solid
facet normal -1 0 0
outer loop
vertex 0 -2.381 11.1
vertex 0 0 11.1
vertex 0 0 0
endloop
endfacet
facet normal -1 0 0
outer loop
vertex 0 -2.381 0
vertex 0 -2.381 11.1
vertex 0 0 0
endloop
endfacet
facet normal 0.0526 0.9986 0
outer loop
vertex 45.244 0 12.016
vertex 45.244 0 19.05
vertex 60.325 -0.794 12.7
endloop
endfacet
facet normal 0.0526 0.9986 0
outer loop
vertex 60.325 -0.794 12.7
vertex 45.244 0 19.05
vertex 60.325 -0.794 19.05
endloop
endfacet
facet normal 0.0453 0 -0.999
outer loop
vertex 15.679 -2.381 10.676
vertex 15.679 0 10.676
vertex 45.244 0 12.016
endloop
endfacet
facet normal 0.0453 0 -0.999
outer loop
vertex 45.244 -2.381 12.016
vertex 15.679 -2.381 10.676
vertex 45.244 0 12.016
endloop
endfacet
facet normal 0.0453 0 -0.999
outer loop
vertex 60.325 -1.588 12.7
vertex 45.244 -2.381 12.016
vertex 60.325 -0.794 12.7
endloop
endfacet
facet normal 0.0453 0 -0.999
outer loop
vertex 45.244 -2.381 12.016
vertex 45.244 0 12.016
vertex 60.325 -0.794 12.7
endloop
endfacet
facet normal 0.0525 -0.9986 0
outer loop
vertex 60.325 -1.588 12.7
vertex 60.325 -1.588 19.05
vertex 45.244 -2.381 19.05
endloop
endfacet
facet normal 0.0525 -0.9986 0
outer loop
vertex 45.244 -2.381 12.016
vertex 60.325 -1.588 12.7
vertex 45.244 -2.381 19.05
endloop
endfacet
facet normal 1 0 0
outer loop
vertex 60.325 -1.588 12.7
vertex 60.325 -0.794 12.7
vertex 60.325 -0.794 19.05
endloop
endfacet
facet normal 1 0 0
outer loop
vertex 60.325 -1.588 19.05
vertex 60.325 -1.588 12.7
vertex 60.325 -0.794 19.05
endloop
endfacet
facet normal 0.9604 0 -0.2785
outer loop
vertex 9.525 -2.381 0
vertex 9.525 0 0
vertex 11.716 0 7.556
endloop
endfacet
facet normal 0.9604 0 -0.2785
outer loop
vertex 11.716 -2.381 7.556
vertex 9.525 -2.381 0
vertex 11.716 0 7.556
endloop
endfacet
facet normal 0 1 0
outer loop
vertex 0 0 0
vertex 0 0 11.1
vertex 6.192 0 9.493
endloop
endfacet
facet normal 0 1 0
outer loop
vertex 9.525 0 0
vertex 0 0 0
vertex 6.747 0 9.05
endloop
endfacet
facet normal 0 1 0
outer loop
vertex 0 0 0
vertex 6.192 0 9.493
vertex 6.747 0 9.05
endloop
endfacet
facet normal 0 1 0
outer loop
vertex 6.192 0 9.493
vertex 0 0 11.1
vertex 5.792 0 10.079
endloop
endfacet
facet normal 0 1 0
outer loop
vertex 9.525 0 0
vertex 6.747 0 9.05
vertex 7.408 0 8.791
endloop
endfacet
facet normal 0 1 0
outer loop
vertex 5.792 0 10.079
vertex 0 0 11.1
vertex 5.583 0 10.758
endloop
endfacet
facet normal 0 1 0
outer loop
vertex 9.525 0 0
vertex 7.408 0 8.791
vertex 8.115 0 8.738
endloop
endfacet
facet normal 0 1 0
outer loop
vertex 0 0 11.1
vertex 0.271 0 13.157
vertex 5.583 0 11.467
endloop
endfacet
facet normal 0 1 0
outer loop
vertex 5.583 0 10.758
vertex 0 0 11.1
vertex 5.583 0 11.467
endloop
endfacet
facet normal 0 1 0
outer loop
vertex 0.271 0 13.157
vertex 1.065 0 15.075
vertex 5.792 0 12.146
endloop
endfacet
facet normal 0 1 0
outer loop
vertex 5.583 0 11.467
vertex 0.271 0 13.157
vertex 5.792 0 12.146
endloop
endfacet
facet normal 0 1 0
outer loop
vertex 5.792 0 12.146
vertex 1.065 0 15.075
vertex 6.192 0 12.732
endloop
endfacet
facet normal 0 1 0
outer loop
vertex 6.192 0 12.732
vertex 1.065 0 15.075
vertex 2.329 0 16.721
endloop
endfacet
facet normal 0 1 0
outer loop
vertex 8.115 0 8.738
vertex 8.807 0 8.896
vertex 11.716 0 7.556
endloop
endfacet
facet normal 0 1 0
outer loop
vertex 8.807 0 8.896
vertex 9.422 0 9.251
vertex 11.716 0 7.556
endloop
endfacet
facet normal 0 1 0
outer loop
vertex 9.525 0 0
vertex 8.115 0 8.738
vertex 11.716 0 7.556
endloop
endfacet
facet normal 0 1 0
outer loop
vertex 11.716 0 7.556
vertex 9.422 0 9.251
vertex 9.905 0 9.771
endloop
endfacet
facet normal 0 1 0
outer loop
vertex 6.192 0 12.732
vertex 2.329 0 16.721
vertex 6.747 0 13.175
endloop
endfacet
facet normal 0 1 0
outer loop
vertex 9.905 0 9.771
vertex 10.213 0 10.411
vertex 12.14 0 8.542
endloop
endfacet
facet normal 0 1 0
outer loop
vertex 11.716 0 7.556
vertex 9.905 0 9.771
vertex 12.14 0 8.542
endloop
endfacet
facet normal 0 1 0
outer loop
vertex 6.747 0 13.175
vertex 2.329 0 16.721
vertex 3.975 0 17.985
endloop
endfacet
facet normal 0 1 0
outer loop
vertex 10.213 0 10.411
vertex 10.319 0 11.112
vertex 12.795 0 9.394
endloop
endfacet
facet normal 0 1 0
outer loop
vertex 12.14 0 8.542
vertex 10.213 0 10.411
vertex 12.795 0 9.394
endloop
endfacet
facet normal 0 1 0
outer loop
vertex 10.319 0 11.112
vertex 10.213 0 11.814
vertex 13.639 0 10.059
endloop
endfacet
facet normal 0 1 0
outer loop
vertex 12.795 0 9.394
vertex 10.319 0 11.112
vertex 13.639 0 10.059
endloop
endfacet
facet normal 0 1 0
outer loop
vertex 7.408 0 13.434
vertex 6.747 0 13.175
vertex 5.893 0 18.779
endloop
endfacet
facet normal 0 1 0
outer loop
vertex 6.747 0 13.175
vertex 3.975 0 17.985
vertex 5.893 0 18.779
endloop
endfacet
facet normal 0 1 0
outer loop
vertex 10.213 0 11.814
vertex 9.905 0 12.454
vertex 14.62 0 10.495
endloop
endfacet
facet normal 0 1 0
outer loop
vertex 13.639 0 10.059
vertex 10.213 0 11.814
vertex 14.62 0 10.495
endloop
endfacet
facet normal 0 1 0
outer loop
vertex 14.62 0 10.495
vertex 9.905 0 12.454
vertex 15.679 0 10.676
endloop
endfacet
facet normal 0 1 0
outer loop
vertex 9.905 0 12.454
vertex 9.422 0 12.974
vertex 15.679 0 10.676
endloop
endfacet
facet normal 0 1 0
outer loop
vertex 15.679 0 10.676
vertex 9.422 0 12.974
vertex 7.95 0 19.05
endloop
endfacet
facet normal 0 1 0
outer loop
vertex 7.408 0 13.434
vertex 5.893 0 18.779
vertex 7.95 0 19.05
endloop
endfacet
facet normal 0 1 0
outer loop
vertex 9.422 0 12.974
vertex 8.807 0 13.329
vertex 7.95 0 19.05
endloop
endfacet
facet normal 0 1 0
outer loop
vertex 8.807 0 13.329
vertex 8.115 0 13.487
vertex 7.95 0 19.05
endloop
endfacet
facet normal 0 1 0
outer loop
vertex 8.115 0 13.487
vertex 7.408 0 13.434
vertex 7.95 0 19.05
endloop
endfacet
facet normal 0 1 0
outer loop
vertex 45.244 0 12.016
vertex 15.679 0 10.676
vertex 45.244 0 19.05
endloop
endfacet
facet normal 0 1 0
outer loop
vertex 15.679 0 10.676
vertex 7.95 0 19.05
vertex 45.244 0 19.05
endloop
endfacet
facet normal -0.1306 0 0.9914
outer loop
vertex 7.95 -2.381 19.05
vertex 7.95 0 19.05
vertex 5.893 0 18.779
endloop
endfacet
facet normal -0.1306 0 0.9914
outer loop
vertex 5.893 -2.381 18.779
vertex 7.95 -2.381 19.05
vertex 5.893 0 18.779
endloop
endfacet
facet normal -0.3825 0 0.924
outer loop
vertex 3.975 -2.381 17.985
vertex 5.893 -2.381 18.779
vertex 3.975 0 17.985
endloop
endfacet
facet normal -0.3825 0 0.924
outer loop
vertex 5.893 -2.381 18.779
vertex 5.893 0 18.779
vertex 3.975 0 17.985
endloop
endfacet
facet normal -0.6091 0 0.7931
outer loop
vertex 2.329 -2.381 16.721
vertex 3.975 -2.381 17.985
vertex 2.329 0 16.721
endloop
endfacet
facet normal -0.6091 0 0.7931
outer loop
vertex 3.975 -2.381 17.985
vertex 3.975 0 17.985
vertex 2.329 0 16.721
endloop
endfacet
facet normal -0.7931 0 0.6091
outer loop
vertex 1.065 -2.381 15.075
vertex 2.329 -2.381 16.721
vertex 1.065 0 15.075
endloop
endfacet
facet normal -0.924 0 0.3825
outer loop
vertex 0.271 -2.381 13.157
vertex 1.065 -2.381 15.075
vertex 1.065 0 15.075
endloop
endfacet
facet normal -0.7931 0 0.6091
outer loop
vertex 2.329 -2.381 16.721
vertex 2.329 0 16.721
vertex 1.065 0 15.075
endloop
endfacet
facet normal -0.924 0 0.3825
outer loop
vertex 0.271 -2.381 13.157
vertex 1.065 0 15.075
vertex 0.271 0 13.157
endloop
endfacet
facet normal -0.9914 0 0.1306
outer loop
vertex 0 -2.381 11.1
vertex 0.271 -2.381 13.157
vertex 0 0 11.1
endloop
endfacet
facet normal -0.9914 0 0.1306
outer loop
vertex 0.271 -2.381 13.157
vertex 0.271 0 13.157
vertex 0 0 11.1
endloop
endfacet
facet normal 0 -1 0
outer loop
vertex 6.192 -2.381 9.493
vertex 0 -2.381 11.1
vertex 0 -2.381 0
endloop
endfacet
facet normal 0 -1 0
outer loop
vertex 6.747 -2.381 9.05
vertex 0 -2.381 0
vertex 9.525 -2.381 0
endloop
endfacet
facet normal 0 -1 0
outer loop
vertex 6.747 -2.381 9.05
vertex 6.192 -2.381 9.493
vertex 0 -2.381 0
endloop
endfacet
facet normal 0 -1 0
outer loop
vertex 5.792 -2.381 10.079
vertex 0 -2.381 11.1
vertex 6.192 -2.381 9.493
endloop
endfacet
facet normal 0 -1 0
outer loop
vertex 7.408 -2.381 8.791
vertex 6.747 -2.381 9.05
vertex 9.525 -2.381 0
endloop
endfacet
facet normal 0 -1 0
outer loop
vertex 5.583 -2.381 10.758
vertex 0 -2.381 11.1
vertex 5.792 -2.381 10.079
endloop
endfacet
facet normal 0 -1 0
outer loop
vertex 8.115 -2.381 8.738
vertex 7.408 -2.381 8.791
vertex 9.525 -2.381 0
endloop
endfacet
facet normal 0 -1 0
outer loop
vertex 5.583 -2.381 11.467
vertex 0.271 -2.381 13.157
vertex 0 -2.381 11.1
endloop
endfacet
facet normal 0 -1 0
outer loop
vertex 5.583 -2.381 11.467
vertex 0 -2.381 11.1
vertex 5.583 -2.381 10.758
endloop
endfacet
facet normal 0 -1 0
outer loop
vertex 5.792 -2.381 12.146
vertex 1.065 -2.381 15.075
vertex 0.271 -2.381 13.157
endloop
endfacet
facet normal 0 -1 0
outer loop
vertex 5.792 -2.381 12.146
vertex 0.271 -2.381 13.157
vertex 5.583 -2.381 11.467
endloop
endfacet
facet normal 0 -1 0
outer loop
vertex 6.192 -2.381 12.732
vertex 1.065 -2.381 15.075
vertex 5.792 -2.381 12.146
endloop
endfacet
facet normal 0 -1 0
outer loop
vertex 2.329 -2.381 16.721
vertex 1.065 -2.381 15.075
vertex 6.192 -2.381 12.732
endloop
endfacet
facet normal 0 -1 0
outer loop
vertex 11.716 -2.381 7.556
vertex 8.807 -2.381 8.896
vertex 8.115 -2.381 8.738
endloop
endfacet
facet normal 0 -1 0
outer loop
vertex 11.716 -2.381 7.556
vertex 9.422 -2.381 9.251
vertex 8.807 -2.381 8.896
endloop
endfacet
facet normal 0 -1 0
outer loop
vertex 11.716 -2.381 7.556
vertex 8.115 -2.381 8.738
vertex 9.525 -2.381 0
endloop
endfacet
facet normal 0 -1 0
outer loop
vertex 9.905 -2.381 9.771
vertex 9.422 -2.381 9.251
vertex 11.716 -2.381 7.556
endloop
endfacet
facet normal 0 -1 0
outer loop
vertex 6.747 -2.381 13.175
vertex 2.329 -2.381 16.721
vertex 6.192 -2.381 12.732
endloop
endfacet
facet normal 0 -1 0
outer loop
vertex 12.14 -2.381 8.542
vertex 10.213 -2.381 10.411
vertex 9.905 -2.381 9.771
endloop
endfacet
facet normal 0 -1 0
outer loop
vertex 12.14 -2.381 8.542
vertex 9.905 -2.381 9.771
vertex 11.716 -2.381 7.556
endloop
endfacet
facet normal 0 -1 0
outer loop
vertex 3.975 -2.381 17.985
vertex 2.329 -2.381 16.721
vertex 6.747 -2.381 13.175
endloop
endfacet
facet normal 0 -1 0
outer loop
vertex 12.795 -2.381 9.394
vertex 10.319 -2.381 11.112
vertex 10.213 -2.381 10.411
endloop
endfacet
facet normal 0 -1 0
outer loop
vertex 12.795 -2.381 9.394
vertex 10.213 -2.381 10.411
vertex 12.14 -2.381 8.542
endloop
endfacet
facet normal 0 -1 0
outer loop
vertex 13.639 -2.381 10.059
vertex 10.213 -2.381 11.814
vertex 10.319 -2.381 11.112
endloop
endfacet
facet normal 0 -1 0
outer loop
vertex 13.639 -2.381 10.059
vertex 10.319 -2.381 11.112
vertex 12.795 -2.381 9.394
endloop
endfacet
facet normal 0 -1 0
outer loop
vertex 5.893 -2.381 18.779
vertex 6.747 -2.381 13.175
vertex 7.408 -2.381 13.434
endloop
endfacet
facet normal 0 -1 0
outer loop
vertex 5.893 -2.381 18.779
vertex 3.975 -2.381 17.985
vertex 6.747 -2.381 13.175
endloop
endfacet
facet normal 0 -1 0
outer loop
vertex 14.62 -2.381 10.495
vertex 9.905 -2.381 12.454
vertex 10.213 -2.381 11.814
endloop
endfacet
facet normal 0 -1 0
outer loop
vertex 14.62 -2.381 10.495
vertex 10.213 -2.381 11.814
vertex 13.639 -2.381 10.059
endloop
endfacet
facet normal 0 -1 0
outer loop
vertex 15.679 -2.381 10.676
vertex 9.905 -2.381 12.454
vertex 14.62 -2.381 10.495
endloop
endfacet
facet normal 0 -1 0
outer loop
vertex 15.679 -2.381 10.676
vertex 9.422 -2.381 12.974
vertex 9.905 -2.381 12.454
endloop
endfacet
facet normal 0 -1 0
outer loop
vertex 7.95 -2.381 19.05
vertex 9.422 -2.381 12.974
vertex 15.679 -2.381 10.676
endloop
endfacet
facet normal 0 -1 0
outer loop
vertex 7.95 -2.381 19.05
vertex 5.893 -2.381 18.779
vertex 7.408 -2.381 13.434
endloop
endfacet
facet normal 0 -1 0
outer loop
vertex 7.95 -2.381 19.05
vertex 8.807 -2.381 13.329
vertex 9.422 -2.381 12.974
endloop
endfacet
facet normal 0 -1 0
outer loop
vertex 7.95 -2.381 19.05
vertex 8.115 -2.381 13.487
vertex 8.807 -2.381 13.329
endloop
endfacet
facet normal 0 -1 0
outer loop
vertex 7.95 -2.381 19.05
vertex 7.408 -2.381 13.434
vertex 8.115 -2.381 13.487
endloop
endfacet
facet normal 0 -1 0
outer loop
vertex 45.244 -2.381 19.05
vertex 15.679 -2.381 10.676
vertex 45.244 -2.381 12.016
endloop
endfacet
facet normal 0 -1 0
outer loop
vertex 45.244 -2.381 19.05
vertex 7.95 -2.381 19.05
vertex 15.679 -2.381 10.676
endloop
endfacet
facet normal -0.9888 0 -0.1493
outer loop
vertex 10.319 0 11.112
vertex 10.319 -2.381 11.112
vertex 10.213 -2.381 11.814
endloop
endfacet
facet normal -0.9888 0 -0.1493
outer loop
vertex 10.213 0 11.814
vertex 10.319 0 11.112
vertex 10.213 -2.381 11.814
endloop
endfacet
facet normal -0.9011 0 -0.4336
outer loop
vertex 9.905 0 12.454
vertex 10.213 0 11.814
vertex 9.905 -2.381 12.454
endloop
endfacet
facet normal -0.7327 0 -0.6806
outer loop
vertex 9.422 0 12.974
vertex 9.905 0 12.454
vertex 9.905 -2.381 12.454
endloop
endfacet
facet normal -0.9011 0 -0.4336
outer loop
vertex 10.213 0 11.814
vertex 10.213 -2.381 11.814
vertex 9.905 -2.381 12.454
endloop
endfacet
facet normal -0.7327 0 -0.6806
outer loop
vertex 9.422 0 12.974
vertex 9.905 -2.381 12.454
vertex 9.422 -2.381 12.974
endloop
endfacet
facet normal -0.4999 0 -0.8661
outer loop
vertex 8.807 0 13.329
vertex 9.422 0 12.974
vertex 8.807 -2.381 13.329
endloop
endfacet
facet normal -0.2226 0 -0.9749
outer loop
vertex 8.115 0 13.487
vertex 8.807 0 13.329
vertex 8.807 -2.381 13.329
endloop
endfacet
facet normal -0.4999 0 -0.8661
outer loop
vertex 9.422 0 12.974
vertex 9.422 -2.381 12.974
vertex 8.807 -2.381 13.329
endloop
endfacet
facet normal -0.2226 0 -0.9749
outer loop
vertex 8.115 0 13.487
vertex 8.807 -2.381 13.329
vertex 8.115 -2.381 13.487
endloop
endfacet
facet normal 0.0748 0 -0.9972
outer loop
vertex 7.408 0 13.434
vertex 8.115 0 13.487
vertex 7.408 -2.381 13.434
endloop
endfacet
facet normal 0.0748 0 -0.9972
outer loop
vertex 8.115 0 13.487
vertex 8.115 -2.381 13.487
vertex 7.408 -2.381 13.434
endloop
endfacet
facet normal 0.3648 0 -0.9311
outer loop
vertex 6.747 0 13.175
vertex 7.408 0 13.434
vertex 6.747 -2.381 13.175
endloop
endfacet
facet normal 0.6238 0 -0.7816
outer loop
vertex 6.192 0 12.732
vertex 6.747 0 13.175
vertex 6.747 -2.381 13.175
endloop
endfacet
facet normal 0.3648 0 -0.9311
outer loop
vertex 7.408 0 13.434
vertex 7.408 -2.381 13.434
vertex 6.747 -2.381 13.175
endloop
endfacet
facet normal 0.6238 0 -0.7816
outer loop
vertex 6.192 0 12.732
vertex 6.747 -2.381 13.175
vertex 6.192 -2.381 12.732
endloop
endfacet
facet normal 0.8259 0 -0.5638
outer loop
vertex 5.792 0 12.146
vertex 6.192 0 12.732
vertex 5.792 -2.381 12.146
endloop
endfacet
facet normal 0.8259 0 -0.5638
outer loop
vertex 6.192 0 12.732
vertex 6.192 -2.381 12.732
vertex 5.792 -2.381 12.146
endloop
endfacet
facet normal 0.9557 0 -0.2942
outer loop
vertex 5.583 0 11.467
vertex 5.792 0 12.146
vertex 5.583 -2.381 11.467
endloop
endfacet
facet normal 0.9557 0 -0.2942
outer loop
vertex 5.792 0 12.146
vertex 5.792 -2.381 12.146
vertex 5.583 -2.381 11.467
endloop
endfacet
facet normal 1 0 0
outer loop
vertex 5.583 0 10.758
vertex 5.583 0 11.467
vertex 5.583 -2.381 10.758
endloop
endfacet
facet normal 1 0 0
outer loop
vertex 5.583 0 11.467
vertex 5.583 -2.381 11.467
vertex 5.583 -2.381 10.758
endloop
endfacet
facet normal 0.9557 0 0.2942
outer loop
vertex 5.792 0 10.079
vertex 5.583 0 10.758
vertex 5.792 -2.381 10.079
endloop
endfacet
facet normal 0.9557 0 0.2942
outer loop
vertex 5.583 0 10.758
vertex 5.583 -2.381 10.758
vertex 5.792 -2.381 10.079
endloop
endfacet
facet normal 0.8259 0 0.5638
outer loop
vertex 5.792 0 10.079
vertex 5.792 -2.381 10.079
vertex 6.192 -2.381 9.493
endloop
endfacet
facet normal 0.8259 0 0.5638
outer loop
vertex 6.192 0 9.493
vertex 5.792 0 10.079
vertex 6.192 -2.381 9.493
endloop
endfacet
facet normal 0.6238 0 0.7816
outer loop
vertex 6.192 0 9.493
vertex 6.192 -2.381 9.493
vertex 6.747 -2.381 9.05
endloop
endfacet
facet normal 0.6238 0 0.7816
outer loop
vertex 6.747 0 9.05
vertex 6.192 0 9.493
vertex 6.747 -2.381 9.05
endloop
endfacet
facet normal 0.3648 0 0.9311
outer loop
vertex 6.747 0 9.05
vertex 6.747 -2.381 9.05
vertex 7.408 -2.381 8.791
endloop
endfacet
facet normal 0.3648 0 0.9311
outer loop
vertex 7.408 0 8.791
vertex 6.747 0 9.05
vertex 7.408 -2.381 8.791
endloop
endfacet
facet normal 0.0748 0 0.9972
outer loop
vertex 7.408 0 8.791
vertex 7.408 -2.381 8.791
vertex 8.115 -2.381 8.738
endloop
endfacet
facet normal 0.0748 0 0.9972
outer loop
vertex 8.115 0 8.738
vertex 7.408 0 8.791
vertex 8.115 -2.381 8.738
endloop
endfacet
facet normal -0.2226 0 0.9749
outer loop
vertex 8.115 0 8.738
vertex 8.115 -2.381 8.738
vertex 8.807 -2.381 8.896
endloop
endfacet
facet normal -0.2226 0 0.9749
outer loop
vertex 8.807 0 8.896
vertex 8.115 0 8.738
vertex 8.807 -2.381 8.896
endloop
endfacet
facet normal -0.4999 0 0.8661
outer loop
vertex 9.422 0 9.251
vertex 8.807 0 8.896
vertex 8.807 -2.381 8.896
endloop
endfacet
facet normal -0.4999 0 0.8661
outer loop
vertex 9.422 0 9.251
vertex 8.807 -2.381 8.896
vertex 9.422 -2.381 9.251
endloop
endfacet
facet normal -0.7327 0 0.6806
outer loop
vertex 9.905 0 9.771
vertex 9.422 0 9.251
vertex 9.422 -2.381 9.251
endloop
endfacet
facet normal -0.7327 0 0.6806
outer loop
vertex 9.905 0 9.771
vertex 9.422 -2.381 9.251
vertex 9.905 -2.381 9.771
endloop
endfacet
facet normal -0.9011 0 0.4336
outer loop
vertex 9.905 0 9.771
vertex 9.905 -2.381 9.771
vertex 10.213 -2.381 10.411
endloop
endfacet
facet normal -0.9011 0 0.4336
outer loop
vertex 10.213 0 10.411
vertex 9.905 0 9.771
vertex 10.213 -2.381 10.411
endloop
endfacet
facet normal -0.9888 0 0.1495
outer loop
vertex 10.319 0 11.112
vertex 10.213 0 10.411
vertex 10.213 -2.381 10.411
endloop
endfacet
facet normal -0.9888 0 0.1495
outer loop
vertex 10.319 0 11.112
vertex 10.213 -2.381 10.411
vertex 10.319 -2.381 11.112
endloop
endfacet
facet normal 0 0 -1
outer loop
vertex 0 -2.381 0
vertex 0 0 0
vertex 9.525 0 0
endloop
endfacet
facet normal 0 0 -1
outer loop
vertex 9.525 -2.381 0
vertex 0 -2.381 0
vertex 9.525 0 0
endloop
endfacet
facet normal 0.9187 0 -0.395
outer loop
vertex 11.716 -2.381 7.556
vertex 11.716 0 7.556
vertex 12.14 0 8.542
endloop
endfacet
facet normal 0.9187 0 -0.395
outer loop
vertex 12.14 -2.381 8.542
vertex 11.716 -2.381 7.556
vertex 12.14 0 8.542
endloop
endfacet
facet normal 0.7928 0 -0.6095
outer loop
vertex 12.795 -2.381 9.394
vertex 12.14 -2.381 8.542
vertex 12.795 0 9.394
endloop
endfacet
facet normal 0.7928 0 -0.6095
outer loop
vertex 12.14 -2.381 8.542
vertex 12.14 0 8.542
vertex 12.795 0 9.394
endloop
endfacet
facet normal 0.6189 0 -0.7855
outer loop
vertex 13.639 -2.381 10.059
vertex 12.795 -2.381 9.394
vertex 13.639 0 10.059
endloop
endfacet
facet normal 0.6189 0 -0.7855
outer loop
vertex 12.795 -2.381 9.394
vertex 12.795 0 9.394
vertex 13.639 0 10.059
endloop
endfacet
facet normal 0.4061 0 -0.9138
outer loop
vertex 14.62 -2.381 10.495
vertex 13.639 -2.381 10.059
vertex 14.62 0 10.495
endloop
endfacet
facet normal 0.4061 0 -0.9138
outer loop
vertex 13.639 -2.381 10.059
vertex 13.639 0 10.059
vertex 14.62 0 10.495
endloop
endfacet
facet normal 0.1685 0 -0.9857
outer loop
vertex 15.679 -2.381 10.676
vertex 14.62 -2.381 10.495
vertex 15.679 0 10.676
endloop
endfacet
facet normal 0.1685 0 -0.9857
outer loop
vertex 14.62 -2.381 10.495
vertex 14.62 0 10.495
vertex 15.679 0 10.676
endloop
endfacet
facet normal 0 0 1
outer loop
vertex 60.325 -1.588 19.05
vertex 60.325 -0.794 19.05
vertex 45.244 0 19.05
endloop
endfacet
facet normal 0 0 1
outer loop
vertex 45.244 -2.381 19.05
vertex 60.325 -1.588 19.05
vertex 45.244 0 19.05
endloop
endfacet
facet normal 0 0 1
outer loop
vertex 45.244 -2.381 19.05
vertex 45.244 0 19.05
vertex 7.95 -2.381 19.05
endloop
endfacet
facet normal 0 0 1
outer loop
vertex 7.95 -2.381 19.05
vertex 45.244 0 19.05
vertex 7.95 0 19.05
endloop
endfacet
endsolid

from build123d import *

# Parameters (mm, degrees)
F1_DEPTH = 2.38125
F2_R     = 2.38125
F3_DEPTH = 25.4
F5_DEPTH = 25.4


# Not quite as in the source:
# - a length typed as a fraction of an inch, garbled in the dataset ("3 / 203.2 mm" for 3/8 in), is restored


with BuildPart() as f1:
    # F0 (on Front) → F1 (new body)
    with BuildSketch(Plane.XZ):
        with BuildLine():
            Line((60.325, 19.05), (7.9502, 19.05))
            ThreePointArc((7.9502, 19.05), (2.3285596682, 16.7214403318), (0, 11.0998))
            Line((0, 11.0998), (0, 0))
            Line((0, 0), (9.525, 0))
            Line((9.525, 0), (11.7155767468, 7.5558858532))
            ThreePointArc((11.7155767468, 7.5558858532), (13.1960389642, 9.7526651699), (15.6788970925, 10.6762577523))
            Line((15.6788970925, 10.6762577523), (60.325, 12.7))
            Line((60.325, 12.7), (60.325, 19.05))
        make_face()
    extrude(amount=F1_DEPTH)

    # F2 (on face) → F3 (cut)
    with BuildSketch(Plane.XZ.offset(2.38125)):
        with Locations((7.9375, 11.1125)):
            Circle(F2_R)
    extrude(amount=-F3_DEPTH, mode=Mode.SUBTRACT)

    # F4 (on face) → F5 (cut)
    with BuildSketch(Plane.XY.offset(19.05)):
        Polygon((60.325, 0), (45.24375, 0), (60.325, -0.79375), align=None)
        Polygon((60.325, -2.38125), (60.325, -1.5875), (45.24375, -2.38125), align=None)
    extrude(amount=-F5_DEPTH, mode=Mode.SUBTRACT)


solid = f1.part
